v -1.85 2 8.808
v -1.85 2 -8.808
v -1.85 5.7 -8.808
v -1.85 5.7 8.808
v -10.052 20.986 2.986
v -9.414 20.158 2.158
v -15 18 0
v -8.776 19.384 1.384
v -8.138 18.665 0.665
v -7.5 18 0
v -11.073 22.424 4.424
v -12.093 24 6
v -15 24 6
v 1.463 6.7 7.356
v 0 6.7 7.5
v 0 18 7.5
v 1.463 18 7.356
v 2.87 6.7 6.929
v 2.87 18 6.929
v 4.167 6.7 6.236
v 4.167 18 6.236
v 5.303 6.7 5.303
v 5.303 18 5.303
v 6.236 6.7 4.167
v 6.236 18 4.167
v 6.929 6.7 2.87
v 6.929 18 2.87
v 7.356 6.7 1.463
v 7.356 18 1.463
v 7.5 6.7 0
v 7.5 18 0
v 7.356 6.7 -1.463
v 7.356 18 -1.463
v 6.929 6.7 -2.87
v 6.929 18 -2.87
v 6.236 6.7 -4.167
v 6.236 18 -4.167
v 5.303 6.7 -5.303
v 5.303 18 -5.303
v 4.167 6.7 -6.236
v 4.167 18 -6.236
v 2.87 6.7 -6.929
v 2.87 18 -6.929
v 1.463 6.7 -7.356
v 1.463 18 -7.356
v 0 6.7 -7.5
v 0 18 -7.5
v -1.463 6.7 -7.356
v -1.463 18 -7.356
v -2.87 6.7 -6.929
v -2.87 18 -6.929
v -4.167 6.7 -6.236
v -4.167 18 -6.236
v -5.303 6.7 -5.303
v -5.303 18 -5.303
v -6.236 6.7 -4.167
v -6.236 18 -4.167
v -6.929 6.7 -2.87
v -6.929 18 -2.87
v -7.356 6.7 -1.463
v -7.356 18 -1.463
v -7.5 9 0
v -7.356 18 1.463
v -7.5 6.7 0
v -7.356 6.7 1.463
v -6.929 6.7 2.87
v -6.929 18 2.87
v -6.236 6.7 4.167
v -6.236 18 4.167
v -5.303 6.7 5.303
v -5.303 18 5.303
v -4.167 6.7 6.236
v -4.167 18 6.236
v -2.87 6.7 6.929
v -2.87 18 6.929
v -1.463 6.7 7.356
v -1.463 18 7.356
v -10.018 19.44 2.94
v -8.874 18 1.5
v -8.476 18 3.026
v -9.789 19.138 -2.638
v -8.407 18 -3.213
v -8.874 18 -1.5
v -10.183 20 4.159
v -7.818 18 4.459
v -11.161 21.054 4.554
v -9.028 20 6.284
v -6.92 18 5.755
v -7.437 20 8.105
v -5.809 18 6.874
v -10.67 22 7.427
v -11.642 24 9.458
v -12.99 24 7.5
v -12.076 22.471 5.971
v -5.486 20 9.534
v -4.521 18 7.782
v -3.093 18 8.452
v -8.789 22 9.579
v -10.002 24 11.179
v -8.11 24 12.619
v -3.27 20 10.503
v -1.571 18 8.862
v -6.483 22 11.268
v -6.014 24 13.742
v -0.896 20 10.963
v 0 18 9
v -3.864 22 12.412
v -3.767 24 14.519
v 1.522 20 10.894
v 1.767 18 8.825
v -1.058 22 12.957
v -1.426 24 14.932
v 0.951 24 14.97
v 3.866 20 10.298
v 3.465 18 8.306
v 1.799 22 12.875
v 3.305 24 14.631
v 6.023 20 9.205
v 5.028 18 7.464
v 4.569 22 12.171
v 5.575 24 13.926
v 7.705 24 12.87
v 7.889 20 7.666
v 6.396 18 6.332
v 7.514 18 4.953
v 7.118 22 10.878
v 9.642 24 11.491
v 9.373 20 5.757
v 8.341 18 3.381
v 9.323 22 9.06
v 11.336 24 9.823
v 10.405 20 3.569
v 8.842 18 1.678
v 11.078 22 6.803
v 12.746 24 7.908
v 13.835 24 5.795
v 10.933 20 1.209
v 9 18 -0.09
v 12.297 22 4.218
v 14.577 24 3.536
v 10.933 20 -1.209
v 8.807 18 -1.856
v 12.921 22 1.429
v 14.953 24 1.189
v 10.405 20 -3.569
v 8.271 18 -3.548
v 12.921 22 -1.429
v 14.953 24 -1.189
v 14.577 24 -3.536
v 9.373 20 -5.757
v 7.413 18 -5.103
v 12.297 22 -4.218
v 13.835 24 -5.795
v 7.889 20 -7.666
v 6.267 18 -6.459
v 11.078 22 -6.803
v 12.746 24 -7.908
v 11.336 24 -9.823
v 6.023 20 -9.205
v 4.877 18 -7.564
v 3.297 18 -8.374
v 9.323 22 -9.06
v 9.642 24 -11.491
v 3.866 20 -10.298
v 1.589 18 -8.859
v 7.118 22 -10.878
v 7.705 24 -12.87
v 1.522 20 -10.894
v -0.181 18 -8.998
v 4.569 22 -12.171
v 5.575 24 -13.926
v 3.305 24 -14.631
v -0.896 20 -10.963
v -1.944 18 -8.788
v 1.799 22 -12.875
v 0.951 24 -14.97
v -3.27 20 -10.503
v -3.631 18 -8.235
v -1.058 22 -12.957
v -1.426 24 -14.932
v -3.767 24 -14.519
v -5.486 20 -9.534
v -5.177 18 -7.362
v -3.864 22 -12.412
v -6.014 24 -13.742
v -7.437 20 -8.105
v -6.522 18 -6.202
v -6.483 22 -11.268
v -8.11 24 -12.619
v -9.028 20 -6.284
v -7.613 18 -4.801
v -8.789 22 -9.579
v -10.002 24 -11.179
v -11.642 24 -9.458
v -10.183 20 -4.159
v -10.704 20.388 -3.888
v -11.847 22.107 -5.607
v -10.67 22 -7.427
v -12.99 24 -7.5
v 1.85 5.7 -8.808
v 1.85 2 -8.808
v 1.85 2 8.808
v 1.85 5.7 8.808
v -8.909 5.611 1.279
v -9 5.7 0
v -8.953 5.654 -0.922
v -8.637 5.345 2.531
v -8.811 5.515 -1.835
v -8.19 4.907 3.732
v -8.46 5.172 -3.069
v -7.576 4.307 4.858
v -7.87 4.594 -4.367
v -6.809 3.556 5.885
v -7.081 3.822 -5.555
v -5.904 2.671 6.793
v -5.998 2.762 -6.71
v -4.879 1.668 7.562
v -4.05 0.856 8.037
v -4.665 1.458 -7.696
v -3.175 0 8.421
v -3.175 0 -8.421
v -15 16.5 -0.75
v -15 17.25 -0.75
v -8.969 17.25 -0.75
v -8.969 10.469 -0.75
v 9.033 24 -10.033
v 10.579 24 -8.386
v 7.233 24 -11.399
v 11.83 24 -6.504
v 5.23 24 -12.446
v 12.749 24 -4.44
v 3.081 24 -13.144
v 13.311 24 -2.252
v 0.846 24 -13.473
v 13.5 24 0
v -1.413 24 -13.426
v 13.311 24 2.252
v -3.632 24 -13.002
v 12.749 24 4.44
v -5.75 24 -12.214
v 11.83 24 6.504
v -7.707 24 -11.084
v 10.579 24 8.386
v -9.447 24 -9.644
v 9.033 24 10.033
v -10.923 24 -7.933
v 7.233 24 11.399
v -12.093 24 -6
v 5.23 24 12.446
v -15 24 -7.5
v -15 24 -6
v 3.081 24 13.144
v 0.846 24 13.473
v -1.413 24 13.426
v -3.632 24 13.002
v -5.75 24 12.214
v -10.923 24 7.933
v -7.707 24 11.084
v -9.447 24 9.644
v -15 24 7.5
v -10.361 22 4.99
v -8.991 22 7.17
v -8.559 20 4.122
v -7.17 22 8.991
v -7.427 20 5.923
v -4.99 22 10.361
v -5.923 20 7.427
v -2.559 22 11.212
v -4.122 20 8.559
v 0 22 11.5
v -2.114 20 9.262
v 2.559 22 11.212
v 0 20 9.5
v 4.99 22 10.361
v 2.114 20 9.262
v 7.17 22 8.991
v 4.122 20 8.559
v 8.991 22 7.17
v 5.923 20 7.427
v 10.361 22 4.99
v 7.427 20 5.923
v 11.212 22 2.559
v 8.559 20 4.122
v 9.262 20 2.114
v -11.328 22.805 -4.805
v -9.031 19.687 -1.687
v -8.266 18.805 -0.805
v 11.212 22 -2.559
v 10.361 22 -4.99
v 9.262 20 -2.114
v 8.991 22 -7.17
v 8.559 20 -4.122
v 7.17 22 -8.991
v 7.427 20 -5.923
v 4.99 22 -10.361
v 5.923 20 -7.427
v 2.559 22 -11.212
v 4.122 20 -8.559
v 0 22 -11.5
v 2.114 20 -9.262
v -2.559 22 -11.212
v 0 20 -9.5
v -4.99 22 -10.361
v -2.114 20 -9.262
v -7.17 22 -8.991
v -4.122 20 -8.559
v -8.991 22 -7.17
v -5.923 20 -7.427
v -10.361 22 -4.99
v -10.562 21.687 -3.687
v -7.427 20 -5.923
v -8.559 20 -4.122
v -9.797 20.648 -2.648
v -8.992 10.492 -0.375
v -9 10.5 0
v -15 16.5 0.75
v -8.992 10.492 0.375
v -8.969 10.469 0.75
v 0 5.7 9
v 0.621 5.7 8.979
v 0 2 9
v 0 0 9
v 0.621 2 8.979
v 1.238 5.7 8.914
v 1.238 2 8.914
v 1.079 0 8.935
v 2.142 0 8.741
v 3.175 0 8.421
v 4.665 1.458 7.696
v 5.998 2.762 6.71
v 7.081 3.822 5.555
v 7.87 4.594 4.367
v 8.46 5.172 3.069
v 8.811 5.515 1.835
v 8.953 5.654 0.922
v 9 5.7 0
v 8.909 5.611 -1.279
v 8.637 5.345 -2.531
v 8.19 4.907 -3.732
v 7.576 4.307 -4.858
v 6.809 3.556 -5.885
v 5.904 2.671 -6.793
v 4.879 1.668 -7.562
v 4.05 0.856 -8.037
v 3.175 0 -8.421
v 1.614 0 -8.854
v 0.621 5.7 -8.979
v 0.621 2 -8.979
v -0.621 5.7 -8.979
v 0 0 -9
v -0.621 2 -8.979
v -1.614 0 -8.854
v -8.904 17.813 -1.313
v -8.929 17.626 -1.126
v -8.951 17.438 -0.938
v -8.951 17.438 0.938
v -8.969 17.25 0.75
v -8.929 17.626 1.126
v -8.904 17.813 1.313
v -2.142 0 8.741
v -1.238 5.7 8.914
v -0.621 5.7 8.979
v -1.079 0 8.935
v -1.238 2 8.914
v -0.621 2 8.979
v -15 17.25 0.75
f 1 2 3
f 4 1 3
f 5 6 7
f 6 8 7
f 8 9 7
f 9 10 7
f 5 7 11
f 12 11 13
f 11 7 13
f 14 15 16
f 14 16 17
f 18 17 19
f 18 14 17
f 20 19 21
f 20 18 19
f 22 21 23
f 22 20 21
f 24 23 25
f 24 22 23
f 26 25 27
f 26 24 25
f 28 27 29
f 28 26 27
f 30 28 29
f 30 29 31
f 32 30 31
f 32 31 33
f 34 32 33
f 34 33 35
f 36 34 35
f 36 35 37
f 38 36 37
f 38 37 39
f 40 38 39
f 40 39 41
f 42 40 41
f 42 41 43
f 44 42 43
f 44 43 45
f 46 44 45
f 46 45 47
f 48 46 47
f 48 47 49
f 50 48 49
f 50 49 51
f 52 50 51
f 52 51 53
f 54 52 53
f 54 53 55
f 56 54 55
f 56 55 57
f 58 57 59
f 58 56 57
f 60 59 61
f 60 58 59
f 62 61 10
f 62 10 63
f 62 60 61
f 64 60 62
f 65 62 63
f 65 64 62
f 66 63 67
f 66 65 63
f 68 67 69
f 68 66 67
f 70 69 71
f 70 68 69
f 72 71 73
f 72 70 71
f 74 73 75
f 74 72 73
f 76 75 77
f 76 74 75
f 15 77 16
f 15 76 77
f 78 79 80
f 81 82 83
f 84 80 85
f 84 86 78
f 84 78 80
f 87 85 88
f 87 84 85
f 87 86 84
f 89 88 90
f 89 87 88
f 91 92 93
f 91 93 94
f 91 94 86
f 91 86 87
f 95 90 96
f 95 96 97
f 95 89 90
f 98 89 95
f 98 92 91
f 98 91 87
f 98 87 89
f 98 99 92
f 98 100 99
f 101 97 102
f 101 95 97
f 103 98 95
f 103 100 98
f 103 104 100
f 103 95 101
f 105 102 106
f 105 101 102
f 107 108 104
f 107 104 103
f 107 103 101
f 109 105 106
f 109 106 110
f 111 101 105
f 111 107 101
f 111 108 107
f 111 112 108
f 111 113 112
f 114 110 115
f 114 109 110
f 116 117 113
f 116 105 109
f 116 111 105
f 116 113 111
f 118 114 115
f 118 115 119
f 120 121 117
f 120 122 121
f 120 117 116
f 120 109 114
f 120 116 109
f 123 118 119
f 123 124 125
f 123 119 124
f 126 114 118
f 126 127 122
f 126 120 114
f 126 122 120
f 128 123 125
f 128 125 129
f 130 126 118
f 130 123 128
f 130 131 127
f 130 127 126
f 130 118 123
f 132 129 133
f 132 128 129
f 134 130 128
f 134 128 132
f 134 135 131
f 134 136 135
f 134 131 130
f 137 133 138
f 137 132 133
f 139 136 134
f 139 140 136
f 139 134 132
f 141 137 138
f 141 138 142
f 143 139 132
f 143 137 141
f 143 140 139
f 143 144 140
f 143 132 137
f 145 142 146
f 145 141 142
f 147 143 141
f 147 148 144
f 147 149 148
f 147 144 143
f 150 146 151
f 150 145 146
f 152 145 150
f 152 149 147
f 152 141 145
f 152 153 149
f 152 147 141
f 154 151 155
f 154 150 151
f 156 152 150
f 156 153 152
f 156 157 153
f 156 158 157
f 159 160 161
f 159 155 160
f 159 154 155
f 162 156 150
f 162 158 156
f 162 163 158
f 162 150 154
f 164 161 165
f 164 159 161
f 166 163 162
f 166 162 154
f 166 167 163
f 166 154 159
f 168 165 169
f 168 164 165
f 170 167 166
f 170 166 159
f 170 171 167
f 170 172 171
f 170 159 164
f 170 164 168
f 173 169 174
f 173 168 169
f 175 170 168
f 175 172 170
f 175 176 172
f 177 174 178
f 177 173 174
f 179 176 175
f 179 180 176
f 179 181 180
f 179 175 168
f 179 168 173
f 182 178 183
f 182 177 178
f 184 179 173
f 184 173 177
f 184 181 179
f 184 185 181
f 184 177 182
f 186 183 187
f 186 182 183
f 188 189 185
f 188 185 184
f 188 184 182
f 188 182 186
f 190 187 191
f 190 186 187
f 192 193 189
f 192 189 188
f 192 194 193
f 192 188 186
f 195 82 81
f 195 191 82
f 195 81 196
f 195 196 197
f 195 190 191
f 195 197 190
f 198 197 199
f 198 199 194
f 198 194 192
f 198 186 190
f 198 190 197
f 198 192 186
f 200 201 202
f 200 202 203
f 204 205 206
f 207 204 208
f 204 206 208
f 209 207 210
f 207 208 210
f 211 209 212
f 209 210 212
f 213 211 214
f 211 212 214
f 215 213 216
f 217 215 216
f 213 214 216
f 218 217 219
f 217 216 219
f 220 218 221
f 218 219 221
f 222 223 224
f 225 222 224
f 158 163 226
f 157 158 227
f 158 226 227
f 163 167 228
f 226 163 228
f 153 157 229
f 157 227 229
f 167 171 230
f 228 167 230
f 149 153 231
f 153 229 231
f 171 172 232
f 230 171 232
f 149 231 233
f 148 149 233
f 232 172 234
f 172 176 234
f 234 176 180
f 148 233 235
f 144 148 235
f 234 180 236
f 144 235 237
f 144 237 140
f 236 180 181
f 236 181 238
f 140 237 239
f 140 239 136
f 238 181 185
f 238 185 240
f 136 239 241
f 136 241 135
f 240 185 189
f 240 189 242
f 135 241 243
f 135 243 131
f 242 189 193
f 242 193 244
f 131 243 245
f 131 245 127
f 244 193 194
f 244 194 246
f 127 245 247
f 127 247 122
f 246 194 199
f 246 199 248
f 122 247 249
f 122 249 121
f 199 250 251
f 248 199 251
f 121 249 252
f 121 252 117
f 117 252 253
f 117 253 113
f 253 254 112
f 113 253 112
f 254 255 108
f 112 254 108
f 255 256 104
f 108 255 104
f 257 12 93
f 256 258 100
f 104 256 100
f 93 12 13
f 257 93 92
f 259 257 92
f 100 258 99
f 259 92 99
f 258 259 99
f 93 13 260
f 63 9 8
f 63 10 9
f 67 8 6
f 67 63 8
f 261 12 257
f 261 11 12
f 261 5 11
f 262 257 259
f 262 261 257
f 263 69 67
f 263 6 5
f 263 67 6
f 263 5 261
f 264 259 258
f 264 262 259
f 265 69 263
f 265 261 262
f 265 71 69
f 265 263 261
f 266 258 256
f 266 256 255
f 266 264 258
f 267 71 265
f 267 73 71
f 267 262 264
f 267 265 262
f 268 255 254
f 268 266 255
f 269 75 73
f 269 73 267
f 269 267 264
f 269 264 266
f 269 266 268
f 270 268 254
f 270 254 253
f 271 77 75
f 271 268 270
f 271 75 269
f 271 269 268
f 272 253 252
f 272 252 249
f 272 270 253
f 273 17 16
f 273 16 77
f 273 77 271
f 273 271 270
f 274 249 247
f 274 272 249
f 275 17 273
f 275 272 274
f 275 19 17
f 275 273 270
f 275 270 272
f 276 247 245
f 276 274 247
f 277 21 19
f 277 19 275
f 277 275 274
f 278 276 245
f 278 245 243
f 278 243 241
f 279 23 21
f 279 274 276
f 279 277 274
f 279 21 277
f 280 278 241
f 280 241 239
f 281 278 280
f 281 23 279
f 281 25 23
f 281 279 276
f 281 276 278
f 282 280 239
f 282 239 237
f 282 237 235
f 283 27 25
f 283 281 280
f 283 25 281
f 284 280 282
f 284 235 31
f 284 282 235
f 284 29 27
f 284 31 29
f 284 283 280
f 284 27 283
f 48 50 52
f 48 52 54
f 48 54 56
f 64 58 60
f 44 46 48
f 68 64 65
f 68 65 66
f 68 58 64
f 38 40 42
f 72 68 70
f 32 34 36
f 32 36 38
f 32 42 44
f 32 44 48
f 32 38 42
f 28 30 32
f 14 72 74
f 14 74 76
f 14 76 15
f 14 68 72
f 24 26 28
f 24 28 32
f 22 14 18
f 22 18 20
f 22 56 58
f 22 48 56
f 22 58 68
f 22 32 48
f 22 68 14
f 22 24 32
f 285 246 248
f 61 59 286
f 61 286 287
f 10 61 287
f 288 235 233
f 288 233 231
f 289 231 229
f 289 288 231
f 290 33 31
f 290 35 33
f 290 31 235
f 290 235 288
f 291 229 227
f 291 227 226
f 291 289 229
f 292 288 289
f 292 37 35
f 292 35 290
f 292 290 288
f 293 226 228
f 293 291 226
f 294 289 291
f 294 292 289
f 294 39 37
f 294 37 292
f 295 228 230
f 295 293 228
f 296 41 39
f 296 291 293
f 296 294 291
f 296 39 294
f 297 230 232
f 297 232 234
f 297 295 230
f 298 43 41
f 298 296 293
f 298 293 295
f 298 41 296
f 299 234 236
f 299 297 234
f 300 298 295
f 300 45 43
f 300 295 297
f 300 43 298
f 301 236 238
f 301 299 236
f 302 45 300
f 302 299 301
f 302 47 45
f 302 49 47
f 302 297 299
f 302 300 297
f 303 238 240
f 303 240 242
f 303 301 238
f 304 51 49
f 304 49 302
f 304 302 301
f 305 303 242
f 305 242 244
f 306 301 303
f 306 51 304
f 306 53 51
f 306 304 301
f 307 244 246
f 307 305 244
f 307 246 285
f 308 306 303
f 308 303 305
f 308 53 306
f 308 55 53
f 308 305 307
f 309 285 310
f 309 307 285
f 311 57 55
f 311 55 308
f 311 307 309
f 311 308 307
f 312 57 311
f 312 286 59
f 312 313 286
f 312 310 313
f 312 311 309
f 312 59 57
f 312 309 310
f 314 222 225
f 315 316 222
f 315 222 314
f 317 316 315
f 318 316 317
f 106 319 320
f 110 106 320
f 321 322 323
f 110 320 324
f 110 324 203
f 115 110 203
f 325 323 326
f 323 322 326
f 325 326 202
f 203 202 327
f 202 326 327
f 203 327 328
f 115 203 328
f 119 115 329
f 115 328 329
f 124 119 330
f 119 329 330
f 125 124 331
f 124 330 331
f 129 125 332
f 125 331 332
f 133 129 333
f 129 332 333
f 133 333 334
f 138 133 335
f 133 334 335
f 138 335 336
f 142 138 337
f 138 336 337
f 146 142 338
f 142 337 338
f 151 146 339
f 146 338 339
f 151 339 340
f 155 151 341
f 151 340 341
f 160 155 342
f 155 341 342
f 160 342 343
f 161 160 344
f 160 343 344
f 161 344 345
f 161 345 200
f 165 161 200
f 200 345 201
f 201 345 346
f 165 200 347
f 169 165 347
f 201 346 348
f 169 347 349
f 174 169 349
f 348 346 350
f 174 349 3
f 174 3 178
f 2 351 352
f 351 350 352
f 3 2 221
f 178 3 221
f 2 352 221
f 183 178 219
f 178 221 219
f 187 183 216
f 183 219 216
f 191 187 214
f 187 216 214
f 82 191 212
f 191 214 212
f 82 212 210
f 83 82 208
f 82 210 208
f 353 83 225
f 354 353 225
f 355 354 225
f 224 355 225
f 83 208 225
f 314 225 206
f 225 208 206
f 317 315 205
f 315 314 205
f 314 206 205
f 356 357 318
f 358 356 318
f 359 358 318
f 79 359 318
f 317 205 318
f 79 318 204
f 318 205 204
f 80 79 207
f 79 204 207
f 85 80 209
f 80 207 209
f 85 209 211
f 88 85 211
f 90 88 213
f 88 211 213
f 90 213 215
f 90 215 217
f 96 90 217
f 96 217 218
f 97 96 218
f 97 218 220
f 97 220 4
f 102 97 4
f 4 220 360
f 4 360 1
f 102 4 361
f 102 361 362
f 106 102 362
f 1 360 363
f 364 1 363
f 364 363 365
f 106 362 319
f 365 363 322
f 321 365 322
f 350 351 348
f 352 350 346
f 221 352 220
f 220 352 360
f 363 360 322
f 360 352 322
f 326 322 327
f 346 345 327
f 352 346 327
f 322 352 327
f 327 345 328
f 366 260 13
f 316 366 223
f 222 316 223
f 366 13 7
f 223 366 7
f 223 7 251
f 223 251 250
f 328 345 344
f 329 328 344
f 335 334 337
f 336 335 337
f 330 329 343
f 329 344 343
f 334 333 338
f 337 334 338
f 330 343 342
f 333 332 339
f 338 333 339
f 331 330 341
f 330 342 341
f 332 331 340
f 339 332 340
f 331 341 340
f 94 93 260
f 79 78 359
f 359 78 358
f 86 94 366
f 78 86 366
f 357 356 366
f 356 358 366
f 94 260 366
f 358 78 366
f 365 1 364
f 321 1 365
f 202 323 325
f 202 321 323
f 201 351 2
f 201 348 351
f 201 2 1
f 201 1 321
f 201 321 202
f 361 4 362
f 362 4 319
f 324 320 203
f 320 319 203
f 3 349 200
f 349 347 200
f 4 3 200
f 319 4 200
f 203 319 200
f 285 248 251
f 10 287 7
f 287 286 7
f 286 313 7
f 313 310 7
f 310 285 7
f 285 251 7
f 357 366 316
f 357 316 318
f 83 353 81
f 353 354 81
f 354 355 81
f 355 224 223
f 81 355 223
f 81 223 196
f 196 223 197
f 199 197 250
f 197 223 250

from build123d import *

# Parameters (mm, degrees)
SKETCH1_R               = 9
BOSS_EXTRUDE1_DEPTH     = 18
CUT_EXTRUDE1_DEPTH      = 23.045407685
CUT_EXTRUDE1_DEPTH_BACK = 23.045407685
SKETCH2_W               = 3.7
SKETCH2_H               = 3.7
CUT_EXTRUDE2_START      = -11.3
SKETCH3_R               = 7.5
CUT_EXTRUDE2_DEPTH      = 11.3
CUT_EXTRUDE3_DEPTH      = 33.031234756
BOSS_EXTRUDE2_REACH     = 43.243
BOSS_EXTRUDE4_DEPTH     = 0.75


with BuildPart() as part:
    # Sketch1 → Boss-Extrude1 (new body)
    with BuildSketch(Plane(origin=(0, 0, 0), x_dir=(1, 0, 0), z_dir=(0, 1, 0))):
        with Locations(Location((0, 0, 0), (0, 0, 270))):
            Circle(SKETCH1_R)
    extrude(amount=BOSS_EXTRUDE1_DEPTH)

    # Sketch2 → Cut-Extrude1 (cut, two sides: drawn at the far end of the back side and taken through both)
    with BuildSketch(Plane.XY.offset(-CUT_EXTRUDE1_DEPTH_BACK)):
        Polygon((-9, 5.7), (-3.175, 0), (-9, 0), align=None)
        Polygon((3.175, 0), (9, 5.7), (9, 0), align=None)
        with Locations((0, 3.85)):
            Rectangle(SKETCH2_W, SKETCH2_H)
    extrude(amount=CUT_EXTRUDE1_DEPTH + CUT_EXTRUDE1_DEPTH_BACK, mode=Mode.SUBTRACT)

    # Sketch3 → Cut-Extrude2 (cut)
    with BuildSketch(Plane(origin=(0, 18, 0), x_dir=(1, 0, 0), z_dir=(0, 1, 0)).offset(CUT_EXTRUDE2_START)):
        with Locations(Location((0, 0, 0), (0, 0, 270))):
            Circle(SKETCH3_R)
    extrude(amount=CUT_EXTRUDE2_DEPTH, mode=Mode.SUBTRACT)

    # Sketch4 → Revolve1 (revolve)
    with BuildSketch(Plane.XY):
        Polygon((9, 18), (15, 24), (13.5, 24), (7.5, 18), align=None)
    revolve(axis=Axis((0, -14.513203436, 0), (0, 1, 0)))

    # Sketch5 → Cut-Extrude3 (cut, through all)
    with BuildSketch(Plane(origin=(0, 0, 0), x_dir=(0, 0, -1), z_dir=(1, 0, 0))):
        Polygon((0, 18), (-6, 24), (6, 24), align=None)
    extrude(amount=-CUT_EXTRUDE3_DEPTH, mode=Mode.SUBTRACT)

    # Sketch6 → Boss-Extrude2 (add, up to next)
    with BuildSketch(Plane(origin=(-15, 0, 0), x_dir=(0, 0, -1), z_dir=(1, 0, 0)), mode=Mode.PRIVATE) as boss_extrude2_sk1:
        Polygon((6, 24), (0, 18), (-6, 24), (-7.5, 24), (0, 16.5), (7.5, 24), align=None)
    boss_extrude2_tool1 = extrude(boss_extrude2_sk1.sketch, amount=BOSS_EXTRUDE2_REACH, mode=Mode.PRIVATE) - part.part
    add(boss_extrude2_tool1.solids().sort_by_distance((-15, 20.881415, -3.118585))[0])

    # Sketch7 → Boss-Extrude4 (add, symmetric)
    with BuildSketch(Plane.XY):
        Polygon((-15, 18), (-15, 16.5), (-7.5, 9), (-7.5, 18), align=None)
    extrude(amount=BOSS_EXTRUDE4_DEPTH, both=True)


solid = part.part
